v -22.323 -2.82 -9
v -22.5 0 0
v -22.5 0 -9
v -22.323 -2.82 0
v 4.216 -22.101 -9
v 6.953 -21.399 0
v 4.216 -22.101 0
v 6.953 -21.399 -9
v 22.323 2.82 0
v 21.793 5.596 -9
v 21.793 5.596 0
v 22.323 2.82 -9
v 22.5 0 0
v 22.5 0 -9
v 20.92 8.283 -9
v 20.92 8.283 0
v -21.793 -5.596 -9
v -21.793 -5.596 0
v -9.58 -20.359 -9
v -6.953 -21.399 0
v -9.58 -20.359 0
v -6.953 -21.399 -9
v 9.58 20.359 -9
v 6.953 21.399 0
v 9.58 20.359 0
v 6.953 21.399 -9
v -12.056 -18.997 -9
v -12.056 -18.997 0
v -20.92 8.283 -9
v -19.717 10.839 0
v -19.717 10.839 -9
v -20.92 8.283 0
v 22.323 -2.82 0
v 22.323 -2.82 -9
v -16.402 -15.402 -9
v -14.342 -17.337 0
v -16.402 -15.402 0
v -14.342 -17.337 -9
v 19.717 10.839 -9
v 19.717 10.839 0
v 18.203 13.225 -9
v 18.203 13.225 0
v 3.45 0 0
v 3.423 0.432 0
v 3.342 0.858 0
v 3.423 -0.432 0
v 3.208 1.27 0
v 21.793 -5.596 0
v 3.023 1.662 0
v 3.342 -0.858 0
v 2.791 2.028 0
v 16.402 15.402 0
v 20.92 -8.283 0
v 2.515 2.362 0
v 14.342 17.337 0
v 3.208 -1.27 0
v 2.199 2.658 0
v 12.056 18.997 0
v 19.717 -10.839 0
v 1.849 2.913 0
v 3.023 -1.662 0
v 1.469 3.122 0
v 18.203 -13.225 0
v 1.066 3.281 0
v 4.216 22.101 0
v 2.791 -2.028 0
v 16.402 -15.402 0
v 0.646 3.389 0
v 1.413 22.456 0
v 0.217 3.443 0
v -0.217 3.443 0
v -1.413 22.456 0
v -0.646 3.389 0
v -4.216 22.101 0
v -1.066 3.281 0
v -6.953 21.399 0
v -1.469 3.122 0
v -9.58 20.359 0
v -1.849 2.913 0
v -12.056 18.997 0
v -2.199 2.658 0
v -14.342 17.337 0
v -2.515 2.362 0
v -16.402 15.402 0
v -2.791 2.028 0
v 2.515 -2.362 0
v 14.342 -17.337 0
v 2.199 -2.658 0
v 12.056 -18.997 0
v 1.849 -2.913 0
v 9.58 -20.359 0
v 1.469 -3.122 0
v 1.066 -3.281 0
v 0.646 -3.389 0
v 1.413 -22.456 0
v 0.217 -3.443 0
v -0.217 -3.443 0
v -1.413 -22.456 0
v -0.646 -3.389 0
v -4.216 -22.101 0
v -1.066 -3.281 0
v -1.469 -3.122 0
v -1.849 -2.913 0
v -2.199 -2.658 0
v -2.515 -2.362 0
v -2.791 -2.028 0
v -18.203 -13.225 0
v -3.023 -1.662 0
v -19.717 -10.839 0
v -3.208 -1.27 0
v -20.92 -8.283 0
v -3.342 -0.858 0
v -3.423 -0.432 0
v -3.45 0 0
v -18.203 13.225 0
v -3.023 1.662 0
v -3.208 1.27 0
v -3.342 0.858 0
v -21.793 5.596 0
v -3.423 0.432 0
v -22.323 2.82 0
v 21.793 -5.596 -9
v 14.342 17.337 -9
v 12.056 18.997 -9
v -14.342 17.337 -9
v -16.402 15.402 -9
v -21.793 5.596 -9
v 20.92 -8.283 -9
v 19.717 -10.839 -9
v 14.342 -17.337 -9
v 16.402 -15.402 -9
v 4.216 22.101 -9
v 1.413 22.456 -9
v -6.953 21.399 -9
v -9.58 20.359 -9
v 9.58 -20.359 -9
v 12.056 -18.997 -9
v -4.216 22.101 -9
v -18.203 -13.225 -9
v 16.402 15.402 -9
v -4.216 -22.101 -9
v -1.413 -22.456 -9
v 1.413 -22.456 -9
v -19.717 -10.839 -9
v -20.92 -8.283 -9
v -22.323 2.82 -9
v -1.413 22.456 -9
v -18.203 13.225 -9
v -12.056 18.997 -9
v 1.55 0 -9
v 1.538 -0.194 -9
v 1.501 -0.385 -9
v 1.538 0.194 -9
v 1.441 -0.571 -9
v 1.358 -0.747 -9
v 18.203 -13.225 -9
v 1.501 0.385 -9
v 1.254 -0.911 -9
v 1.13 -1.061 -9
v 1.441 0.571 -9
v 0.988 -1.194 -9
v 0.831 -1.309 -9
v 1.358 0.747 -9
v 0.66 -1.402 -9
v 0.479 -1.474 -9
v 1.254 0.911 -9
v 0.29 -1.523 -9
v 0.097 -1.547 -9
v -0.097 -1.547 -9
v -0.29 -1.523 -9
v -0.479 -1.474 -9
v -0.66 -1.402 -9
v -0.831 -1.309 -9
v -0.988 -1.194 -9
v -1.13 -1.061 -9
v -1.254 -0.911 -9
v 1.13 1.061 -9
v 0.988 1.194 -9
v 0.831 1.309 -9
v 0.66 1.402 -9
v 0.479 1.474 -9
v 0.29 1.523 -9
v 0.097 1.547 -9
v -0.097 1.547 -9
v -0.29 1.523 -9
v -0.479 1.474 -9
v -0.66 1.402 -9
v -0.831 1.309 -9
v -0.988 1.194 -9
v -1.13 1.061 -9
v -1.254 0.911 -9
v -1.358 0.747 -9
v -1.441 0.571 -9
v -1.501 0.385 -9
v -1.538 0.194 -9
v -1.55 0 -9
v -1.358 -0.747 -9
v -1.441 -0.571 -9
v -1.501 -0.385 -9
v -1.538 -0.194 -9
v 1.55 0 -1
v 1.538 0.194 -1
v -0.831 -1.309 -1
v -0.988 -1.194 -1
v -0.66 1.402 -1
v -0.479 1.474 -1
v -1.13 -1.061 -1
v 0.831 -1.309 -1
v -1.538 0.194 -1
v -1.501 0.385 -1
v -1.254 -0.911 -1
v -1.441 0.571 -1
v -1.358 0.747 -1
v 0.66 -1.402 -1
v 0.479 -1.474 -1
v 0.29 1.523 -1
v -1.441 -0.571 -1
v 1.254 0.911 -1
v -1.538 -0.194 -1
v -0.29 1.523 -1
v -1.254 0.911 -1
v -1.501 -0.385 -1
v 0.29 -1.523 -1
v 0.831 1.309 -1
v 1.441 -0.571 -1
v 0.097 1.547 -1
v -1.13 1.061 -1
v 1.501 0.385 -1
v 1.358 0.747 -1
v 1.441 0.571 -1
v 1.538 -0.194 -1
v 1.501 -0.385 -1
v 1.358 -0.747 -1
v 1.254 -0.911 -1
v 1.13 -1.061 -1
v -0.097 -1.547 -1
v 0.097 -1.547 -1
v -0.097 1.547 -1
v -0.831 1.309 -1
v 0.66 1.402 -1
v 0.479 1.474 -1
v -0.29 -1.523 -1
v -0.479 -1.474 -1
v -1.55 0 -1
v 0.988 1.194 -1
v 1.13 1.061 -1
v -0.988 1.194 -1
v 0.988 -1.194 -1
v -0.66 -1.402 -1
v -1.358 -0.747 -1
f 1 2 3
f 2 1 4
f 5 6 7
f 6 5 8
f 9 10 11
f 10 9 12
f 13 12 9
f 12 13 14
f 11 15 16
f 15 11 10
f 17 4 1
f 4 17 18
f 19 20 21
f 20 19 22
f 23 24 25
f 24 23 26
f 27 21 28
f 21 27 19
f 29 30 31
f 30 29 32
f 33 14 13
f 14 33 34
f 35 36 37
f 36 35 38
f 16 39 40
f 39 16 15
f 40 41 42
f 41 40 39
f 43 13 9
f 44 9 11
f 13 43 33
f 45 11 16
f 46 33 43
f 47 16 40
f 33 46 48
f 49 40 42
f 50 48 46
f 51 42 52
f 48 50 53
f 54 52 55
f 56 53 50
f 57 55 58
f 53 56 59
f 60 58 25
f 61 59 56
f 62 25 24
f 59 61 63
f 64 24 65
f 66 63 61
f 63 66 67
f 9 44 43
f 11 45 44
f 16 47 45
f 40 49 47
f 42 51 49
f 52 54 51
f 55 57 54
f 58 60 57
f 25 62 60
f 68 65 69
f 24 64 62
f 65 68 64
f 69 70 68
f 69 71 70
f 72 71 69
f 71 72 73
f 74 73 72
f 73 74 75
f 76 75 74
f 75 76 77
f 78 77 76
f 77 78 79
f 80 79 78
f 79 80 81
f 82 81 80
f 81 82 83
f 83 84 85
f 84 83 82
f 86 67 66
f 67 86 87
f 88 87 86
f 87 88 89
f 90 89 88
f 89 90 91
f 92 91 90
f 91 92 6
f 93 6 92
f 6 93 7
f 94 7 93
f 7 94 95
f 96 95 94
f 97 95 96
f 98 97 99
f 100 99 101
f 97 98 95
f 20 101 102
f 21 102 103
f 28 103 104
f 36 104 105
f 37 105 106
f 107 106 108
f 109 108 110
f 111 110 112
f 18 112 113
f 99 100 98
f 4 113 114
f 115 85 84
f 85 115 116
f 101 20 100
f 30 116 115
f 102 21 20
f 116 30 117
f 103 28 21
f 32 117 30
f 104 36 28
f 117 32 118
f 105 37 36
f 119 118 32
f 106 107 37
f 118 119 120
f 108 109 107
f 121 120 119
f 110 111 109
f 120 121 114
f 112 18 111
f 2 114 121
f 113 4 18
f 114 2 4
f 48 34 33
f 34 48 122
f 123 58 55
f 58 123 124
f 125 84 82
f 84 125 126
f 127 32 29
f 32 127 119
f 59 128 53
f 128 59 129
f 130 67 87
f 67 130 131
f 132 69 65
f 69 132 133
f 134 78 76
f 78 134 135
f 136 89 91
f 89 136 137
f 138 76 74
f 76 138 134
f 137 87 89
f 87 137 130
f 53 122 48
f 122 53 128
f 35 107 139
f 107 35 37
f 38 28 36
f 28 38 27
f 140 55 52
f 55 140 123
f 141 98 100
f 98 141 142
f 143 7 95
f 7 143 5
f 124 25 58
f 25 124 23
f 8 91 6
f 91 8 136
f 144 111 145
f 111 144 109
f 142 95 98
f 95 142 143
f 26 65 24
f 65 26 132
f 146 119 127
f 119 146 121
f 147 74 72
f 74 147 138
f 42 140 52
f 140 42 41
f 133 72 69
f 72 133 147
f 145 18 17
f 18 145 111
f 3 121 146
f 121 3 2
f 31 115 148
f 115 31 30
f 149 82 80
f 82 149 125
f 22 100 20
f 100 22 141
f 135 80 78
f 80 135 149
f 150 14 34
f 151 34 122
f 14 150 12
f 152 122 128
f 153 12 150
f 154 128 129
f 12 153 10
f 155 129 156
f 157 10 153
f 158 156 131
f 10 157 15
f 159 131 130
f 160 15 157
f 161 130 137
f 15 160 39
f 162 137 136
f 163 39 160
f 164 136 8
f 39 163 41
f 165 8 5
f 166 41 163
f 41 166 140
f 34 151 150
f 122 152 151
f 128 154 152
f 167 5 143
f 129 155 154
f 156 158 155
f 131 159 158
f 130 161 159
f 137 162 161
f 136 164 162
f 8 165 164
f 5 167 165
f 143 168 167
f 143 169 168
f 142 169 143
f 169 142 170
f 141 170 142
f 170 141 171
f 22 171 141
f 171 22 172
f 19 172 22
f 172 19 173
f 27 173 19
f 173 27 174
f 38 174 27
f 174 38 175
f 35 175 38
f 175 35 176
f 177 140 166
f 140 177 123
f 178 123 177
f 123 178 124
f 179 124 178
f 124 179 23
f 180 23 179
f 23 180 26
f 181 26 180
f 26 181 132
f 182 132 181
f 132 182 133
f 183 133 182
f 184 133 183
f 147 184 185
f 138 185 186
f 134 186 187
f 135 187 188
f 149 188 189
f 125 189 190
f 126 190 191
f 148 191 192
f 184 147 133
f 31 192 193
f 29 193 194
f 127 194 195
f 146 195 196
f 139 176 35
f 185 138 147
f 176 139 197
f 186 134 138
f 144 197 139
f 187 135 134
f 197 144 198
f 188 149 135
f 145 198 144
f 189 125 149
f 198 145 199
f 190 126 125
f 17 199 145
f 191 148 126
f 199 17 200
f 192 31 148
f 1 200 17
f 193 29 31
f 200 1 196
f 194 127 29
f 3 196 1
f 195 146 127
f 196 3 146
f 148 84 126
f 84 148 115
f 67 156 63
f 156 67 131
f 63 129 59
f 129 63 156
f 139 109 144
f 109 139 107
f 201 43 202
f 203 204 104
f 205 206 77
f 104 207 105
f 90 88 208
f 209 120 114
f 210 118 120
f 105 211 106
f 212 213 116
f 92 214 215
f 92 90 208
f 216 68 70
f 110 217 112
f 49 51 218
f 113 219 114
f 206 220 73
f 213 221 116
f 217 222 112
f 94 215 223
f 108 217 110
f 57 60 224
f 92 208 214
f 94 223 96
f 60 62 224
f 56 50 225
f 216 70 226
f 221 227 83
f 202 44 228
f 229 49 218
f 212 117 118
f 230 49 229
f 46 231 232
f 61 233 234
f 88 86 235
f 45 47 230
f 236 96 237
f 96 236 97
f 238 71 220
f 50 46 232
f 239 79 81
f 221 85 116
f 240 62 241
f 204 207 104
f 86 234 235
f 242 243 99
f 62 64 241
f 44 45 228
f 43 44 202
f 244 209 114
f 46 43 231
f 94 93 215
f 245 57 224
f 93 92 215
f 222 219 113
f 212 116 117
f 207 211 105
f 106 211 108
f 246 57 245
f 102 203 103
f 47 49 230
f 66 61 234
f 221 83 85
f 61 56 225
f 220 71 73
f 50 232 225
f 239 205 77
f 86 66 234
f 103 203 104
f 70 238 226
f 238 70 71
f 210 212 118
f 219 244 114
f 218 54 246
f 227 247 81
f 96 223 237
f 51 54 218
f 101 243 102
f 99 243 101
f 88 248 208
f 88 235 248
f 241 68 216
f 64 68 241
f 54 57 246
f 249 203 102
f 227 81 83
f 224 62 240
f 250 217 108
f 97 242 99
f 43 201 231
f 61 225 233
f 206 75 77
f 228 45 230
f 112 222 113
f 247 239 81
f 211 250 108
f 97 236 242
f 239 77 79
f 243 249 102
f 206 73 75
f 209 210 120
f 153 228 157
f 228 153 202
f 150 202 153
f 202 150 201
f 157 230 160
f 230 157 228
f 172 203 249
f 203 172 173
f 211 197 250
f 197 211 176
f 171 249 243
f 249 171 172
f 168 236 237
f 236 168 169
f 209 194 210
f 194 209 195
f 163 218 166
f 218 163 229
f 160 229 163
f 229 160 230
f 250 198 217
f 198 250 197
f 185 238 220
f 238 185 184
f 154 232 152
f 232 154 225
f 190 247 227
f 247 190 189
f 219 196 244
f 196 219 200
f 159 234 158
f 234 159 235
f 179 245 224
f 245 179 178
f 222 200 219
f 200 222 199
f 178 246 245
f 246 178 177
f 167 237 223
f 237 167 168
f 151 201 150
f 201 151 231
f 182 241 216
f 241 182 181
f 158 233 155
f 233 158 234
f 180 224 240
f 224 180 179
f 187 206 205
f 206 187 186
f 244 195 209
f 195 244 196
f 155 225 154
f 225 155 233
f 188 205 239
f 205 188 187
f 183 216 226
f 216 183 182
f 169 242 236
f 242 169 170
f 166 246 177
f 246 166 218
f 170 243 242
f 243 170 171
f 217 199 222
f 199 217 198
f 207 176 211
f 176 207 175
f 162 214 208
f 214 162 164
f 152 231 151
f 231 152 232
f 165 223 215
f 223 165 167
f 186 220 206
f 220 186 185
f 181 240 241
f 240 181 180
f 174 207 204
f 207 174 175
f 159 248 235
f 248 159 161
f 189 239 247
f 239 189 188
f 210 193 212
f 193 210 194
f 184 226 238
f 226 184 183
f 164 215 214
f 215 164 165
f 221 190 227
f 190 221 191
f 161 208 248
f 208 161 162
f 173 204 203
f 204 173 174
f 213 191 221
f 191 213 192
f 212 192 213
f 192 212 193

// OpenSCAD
$fn = 50;


difference() {
	union() {
		translate(v = [0, 0, -9.0000000000]) {
			cylinder(h = 9, r = 22.5000000000);
		}
		translate(v = [0, 0, -9.0000000000]) {
			cylinder(h = 9, r = 2.8750000000);
		}
	}
	union() {
		translate(v = [0, 0, 0]) {
			rotate(a = [0, 0, 0]) {
				difference() {
					union() {
						translate(v = [0, 0, -9.0000000000]) {
							cylinder(h = 9, r = 1.2500000000);
						}
						translate(v = [0, 0, -1.0000000000]) {
							cylinder(h = 1.0000000000, r1 = 1.5500000000, r2 = 3.4500000000);
						}
						translate(v = [0, 0, -9.0000000000]) {
							cylinder(h = 9, r = 1.5500000000);
						}
						translate(v = [0, 0, -9.0000000000]) {
							cylinder(h = 9, r = 1.2500000000);
						}
					}
					union();
				}
			}
		}
	}
}
